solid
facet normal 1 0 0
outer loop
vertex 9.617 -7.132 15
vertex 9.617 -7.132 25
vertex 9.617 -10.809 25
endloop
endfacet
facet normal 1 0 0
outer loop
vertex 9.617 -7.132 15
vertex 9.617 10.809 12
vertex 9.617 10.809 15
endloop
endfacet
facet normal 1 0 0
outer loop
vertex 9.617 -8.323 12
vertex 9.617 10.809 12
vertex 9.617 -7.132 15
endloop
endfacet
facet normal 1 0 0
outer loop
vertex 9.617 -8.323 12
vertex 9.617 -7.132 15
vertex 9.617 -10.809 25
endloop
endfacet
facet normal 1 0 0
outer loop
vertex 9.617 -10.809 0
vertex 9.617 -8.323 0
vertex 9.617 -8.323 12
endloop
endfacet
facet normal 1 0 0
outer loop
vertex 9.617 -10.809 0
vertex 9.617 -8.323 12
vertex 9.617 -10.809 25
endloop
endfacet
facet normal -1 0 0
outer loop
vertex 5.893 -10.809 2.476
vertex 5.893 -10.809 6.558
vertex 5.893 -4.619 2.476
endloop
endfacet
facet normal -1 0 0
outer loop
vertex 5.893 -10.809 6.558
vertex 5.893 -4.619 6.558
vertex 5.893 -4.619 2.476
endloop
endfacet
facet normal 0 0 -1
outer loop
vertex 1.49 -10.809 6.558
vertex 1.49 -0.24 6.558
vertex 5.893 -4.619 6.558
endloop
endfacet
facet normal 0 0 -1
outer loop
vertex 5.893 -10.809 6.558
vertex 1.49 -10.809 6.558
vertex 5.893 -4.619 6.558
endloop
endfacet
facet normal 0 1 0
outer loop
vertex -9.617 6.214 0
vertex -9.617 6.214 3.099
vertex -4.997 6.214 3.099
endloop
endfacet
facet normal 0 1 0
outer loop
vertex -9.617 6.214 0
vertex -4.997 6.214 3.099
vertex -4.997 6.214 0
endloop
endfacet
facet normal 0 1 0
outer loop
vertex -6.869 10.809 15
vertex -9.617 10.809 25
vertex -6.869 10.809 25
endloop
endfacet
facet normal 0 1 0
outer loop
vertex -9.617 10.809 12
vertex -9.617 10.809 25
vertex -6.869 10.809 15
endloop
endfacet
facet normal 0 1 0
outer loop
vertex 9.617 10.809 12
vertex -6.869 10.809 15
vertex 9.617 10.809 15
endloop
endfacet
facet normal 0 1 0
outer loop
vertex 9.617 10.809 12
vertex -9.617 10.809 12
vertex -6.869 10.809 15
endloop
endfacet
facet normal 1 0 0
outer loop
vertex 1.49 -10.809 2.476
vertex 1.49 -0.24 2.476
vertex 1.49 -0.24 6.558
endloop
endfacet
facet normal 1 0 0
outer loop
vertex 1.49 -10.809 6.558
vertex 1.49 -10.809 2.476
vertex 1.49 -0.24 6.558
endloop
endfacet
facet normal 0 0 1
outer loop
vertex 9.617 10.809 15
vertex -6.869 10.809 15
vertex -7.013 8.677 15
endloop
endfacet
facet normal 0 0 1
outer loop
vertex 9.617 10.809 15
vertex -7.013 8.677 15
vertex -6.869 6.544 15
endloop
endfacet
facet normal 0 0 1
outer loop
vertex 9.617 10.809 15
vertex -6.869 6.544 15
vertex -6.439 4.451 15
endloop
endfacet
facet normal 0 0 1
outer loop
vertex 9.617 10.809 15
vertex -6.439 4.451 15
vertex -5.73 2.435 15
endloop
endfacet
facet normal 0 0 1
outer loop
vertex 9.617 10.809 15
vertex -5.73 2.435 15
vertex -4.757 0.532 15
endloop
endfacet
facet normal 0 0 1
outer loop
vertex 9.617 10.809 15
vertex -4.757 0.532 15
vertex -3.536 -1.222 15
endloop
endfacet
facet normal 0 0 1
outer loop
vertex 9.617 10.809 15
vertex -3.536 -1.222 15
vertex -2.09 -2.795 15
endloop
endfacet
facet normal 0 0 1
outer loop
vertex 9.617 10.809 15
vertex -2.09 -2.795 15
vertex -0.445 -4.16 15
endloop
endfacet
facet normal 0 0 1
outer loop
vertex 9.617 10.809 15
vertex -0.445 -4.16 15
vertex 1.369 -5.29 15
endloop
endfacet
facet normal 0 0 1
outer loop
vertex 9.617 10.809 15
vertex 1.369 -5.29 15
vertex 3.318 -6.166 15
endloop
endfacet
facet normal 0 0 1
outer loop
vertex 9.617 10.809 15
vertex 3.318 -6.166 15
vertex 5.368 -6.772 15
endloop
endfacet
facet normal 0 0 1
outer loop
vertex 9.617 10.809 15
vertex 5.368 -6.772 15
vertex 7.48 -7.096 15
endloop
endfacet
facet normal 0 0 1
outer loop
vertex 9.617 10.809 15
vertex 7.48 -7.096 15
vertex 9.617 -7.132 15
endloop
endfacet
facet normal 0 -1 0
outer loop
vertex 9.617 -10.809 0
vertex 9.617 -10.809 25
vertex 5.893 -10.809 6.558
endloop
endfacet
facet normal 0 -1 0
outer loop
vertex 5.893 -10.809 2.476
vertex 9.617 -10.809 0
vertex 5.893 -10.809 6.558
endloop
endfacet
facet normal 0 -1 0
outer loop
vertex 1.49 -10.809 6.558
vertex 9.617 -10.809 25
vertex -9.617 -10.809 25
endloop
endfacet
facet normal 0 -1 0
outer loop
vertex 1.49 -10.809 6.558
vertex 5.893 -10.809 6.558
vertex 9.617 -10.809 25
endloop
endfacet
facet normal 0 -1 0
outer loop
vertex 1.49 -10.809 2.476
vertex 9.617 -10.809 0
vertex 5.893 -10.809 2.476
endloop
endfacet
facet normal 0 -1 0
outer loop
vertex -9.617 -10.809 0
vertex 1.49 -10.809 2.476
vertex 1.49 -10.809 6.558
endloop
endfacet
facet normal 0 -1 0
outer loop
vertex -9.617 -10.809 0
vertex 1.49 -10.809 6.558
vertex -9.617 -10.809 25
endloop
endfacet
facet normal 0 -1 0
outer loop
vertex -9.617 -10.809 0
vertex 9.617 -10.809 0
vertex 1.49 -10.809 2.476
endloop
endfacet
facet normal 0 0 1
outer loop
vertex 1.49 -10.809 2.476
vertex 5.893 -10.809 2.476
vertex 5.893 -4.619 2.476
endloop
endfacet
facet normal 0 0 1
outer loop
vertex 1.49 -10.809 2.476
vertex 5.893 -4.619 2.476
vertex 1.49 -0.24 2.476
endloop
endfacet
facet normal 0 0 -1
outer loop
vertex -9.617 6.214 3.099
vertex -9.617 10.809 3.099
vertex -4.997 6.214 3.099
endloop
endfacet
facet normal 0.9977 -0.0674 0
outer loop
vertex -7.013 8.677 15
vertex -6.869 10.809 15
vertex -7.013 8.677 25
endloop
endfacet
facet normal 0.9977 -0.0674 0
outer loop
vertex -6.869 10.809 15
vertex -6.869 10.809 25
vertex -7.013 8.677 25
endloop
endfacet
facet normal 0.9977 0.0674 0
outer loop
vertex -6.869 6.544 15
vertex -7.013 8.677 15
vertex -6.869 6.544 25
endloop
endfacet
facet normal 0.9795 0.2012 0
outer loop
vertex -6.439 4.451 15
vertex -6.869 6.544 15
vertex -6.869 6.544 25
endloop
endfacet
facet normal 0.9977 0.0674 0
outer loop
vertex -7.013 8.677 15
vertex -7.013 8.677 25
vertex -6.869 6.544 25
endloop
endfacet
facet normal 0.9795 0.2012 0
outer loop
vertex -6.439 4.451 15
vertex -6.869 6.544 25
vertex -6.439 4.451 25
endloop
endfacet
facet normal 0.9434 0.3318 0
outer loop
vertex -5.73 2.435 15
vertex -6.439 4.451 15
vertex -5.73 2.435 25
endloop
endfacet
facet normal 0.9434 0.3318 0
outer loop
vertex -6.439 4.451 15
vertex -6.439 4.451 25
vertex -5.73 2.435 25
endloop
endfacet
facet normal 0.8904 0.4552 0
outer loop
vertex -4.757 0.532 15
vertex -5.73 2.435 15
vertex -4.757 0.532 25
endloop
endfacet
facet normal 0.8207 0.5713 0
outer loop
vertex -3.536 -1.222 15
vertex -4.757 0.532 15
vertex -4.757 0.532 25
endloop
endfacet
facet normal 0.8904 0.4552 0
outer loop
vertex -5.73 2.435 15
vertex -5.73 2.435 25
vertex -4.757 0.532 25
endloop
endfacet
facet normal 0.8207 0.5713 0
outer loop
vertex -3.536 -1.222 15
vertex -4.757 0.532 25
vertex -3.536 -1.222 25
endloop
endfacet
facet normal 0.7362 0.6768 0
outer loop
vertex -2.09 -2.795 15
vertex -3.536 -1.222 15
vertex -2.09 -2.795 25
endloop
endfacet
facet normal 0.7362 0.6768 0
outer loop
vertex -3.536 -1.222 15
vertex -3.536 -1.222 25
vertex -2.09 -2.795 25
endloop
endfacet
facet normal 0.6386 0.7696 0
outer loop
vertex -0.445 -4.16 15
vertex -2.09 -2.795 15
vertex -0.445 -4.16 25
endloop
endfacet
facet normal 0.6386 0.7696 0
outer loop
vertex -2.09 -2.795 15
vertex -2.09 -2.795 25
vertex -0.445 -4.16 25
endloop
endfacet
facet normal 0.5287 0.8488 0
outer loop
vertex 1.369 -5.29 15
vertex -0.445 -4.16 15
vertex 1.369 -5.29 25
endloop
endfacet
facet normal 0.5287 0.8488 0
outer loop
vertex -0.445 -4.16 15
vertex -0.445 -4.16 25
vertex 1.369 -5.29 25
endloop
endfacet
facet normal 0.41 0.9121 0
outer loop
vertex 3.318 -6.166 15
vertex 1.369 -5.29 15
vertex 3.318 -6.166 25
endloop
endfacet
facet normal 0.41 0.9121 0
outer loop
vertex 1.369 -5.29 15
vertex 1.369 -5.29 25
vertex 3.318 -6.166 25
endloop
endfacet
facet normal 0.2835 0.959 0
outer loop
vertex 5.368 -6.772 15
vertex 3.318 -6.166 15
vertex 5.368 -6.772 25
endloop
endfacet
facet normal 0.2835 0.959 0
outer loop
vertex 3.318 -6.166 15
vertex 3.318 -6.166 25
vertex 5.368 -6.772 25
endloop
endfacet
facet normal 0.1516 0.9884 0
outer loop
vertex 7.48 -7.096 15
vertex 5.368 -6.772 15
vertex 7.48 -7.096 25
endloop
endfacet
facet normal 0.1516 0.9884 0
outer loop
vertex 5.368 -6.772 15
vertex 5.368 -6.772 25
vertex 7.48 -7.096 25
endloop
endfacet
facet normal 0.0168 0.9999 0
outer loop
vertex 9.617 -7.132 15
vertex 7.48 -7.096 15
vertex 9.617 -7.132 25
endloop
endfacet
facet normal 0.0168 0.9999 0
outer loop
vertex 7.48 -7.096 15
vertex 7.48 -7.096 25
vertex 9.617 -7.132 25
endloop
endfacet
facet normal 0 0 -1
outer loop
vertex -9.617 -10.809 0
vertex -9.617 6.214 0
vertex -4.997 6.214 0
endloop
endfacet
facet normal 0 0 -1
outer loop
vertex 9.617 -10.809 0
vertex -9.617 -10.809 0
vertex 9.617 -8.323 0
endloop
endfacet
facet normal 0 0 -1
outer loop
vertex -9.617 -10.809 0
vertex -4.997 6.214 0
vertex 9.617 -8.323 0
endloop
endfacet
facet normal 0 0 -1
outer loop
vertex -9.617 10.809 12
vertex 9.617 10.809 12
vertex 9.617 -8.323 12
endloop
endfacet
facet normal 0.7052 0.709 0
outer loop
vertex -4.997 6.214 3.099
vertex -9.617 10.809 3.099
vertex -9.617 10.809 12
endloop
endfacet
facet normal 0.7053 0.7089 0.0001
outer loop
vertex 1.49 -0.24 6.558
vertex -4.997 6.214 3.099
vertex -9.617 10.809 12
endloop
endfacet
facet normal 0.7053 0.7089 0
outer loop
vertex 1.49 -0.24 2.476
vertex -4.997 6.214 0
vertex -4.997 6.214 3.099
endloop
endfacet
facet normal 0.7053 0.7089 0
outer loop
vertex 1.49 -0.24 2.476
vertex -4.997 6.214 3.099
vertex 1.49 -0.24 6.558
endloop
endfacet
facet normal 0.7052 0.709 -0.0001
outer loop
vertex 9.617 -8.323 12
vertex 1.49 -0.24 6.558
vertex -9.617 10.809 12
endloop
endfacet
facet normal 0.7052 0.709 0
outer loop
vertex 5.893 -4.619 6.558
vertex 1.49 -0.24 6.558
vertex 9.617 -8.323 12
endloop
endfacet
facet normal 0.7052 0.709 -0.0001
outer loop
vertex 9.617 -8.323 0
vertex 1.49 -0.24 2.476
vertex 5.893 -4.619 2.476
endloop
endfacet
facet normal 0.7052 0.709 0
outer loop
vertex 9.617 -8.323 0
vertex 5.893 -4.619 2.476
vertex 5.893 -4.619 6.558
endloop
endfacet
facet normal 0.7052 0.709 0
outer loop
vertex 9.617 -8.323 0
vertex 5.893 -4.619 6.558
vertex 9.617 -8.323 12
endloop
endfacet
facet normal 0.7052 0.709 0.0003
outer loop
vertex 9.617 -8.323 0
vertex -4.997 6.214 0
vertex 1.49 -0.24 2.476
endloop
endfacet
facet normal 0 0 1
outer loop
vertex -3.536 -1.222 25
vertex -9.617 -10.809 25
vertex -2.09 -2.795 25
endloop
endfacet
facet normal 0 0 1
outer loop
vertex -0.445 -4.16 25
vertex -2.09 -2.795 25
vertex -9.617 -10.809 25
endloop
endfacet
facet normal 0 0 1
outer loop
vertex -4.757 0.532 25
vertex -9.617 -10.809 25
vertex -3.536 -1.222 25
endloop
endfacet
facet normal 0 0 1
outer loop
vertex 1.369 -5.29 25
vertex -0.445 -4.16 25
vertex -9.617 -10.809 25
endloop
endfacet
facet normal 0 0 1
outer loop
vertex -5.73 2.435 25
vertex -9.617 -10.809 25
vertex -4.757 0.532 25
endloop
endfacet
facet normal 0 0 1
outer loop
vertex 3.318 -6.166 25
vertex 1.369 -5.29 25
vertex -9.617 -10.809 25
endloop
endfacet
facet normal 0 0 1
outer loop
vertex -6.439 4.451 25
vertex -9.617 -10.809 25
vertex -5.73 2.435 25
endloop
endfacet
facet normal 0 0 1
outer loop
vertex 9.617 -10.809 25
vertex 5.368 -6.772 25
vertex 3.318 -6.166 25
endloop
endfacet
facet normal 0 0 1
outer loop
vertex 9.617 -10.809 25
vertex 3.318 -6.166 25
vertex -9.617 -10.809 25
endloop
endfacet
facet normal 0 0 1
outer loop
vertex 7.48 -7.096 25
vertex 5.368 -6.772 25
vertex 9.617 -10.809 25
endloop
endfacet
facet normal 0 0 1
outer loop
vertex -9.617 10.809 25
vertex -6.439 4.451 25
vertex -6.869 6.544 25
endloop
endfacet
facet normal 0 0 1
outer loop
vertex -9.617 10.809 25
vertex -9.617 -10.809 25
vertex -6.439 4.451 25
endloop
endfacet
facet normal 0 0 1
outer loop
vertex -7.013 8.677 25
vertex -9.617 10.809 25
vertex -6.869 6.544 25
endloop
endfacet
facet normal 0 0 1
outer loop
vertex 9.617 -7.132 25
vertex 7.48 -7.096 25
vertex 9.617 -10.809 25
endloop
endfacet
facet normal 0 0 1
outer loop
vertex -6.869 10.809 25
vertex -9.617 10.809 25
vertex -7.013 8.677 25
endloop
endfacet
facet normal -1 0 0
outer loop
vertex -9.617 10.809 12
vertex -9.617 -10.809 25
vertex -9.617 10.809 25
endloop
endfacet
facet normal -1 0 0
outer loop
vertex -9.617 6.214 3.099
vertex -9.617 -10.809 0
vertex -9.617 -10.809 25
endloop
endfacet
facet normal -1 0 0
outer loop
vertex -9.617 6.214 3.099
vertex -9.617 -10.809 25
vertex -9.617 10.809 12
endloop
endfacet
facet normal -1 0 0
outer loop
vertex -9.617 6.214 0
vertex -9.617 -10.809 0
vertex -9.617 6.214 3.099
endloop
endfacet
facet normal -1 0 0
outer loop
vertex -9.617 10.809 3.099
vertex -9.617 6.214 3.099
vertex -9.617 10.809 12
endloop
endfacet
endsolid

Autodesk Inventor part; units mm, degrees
ref_plane "YZ Plane" through (0, 0, 0) normal (1, 0, 0) x (0, 1, 0)
ref_plane "XZ Plane" through (0, 0, 0) normal (0, 1, 0) x (-1, 0, 0)
ref_plane "XY Plane" through (0, 0, 0) normal (0, 0, 1) x (1, 0, 0)
sketch "스케치1" plane through (0, 0, 0) normal (0, 0, 1) x (1, 0, 0)
  line L0 (9.6169, -10.809) -> (-9.6169, -10.809)
  line L1 (-9.6169, -10.809) -> (-9.6169, 10.809)
  line L2 (-9.6169, 10.809) -> (9.6169, 10.809)
  line L3 (9.6169, 10.809) -> (9.6169, -10.809)
  line L4 (9.6169, -10.809) -> (-9.6169, 10.809) construction
  line L5 (-9.6169, -10.809) -> (9.6169, 10.809) construction
  point P0 (0, 0)
extrude "돌출1" add sketch "스케치1" along normal blind 25
sketch "스케치2" plane through (-9.6169, 10.809, 0) normal (0, 1, 0) x (1, 0, 0)
  point P0 (9.6169, 0)
sketch "스케치3" plane through (0, 0, 25) normal (0, 0, 1) x (1, 0, 0)
  line L0 (9.6169, -10.809) -> (9.6169, 10.809) projected
  arc A0 (-6.8694, 10.809) -> (9.6169, -7.1319) centre (8.8168, 8.6782) ccw
  line L1 (-6.8694, 10.809) -> (9.6169, 10.809)
  point P0 (0, 0)
extrude "돌출2" cut sketch "스케치3" against normal blind 10
sketch "스케치4" plane through (0, 0, 0) normal (0, 0, -1) x (-1, 0, 0)
  line L0 (9.6169, 10.809) -> (9.6169, -10.809) projected
  line L1 (9.6169, 10.809) -> (-9.6169, -8.323)
  line L2 (-9.6169, 10.809) -> (-9.6169, -10.809) projected
  line L3 (-9.6169, -8.323) -> (-9.6169, 10.809)
  line L4 (9.6169, 10.809) -> (-9.6169, 10.809) projected
  line L5 (9.6169, 10.809) -> (-9.6169, 10.809)
  point P0 (0, 0)
sketch "스케치5" plane through (-9.6169, 10.809, 0) normal (0, 1, 0) x (1, 0, 0)
  line L0 (11.1073, -6.5575) -> (15.5096, -6.5575)
  line L1 (15.5096, -6.5575) -> (15.5096, -2.4763)
  line L2 (15.5096, -2.4763) -> (11.1073, -2.4763)
  line L3 (11.1073, -2.4763) -> (11.1073, -6.5575)
  line L4 (0, 0) -> (19.2339, 0) projected
  line L5 (0.0558, -2.4763) -> (5.1459, -2.4763)
  line L6 (5.1459, -2.4763) -> (5.1459, 0)
  line L7 (5.1459, 0) -> (0.0558, 0)
  line L8 (0.0558, 0) -> (0.0558, -2.4763)
  point P0 (9.6169, 0)
extrude "돌출3" cut sketch "스케치5" against normal blind 50 contours L3 L2 L1 L0
extrude "돌출4" cut sketch "스케치4" against normal blind 12
sketch "스케치6" plane through (-9.6169, -10.809, 25) normal (-1, 0, 0) x (0, 0, 1)
  line L0 (-25, 21.6179) -> (-13, 21.6179) projected
  line L1 (-25, 21.6179) -> (-21.9007, 21.6179)
  line L2 (-21.9007, 21.6179) -> (-21.9007, 17.0226)
  line L3 (-21.9007, 17.0226) -> (-25, 17.0226)
  line L4 (-25, 17.0226) -> (-25, 21.6179)
  point P0 (-25, 10.809)
extrude "돌출5" cut sketch "스케치6" against normal blind 12
properties part number "240510_3Dsketch08"
